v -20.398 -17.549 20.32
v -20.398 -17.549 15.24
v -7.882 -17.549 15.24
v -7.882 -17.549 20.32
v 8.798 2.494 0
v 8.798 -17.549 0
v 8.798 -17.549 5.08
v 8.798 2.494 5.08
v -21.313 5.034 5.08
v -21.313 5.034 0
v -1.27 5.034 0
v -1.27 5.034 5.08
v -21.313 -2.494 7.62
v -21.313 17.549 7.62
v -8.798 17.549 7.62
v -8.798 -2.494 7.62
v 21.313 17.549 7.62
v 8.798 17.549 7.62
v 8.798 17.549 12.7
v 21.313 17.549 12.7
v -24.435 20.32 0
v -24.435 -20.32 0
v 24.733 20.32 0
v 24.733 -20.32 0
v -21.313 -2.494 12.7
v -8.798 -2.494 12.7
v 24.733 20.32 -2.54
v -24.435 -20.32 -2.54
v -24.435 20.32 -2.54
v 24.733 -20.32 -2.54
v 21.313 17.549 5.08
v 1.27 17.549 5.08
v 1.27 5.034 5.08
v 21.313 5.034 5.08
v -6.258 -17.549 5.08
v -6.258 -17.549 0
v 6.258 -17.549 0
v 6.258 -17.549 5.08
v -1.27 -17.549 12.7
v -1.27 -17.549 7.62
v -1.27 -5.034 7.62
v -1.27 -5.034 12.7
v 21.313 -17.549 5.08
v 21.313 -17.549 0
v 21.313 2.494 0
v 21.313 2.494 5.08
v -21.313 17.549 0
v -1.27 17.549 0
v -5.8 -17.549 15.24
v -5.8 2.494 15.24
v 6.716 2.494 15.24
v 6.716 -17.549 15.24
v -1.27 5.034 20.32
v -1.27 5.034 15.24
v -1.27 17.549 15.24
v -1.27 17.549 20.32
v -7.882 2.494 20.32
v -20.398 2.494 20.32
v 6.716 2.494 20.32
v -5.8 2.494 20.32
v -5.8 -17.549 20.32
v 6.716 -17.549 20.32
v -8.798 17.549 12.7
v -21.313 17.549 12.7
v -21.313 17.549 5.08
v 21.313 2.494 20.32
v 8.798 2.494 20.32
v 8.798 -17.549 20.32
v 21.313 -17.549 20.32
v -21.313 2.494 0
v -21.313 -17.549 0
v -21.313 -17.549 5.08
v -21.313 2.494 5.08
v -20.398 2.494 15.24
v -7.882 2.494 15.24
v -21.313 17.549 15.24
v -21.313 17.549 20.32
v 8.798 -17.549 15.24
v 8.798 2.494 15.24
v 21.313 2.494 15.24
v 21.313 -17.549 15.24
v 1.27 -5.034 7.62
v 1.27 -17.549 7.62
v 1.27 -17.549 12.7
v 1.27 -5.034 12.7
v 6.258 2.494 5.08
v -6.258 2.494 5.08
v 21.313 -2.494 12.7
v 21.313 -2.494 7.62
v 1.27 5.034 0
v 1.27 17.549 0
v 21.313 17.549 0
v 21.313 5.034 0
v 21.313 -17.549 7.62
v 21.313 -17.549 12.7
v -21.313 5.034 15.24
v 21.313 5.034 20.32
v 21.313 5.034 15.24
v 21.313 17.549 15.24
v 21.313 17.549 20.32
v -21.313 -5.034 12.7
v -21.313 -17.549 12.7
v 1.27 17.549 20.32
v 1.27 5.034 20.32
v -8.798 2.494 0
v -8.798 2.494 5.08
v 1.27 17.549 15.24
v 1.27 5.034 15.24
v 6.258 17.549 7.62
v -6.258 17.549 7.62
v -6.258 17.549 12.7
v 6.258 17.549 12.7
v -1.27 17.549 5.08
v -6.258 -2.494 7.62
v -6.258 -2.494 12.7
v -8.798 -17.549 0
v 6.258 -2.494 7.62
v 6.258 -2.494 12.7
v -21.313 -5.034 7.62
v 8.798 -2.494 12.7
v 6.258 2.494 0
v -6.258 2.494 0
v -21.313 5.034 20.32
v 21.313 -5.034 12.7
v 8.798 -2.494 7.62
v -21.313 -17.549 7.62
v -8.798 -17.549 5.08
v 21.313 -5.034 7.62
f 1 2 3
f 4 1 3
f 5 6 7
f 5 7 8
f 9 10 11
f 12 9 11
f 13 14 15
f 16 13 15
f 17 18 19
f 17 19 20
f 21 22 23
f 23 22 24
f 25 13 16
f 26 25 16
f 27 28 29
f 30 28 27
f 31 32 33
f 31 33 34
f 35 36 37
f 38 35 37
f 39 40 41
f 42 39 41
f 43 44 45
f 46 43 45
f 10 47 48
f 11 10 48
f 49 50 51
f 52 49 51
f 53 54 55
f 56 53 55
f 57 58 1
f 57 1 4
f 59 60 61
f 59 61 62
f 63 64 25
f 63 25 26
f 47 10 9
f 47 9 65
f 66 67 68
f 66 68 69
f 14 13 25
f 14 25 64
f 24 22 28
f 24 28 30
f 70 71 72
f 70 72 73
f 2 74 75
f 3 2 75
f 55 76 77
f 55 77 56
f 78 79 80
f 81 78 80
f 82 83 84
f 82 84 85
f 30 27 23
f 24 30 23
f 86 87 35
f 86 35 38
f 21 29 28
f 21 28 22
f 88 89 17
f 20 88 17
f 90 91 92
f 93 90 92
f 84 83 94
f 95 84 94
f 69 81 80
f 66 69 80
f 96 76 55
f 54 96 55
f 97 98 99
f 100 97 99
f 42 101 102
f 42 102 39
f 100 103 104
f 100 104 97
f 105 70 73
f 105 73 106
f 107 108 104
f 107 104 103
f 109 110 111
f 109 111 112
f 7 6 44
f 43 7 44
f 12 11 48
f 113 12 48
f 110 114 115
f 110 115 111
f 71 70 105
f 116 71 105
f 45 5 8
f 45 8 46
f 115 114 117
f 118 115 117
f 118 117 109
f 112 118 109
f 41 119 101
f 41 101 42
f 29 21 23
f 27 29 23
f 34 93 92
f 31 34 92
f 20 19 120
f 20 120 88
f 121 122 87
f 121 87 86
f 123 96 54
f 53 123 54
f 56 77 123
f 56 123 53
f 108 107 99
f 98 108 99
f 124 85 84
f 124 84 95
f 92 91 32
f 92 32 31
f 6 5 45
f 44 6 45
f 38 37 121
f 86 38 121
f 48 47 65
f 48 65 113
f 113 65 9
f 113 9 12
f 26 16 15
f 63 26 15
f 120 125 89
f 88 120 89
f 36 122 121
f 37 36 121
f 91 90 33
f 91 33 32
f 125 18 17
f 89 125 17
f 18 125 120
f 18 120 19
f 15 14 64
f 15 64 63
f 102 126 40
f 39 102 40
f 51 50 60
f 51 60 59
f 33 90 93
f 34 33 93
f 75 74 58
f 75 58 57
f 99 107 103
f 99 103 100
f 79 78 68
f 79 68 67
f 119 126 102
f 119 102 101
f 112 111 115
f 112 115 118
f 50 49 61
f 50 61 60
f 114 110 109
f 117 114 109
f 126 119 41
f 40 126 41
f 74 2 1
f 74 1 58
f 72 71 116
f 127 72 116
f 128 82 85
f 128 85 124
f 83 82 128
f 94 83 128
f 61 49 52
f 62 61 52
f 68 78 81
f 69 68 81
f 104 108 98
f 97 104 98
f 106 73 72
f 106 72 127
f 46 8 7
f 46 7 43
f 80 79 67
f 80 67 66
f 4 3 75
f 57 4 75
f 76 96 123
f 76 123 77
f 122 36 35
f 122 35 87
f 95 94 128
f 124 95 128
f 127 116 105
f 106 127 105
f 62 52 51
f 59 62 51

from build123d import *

# Parameters (mm, degrees)
F0_W     = 20.0432797
F0_H     = 12.5155309215
F1_DEPTH = 5.08
F0_W_2   = 12.5155309215
F0_H_2   = 20.0432797
F2_W     = 49.1681545973
F2_H     = 2.54
F3_DEPTH = 20.32
F5_W     = 12.5155309215
F5_H     = 20.0432797
F6_DEPTH = 5.08
F5_W_2   = 20.0432797
F5_H_2   = 12.5155309215
F8_W     = 20.0432797
F8_H     = 12.5155309215
F9_DEPTH = 5.08
F8_W_2   = 12.5155309215
F8_H_2   = 20.0432797


with BuildPart() as f1:
    # F0 (on Top) → F1 (new body)
    with BuildSketch(Plane.XY):
        with Locations((11.29163985, 11.2916406392)):
            Rectangle(F0_W, F0_H)
    extrude(amount=F1_DEPTH)


with BuildPart() as f1b:
    # F0 (on Top) → F1, piece 2 (new body)
    with BuildSketch(Plane.XY):
        with Locations((15.0555253608, -7.5277646715)):
            Rectangle(F0_W_2, F0_H_2)
    extrude(amount=F1_DEPTH)


with BuildPart() as f1c:
    # F0 (on Top) → F1, piece 3 (new body)
    with BuildSketch(Plane.XY):
        with Locations((-5.5608e-06, -7.5277646715)):
            Rectangle(F0_W_2, F0_H_2)
    extrude(amount=F1_DEPTH)


with BuildPart() as f1d:
    # F0 (on Top) → F1, piece 4 (new body)
    with BuildSketch(Plane.XY):
        with Locations((-15.0555364823, -7.5277646715)):
            Rectangle(F0_W_2, F0_H_2)
    extrude(amount=F1_DEPTH)


with BuildPart() as f1e:
    # F0 (on Top) → F1, piece 5 (new body)
    with BuildSketch(Plane.XY):
        with Locations((-11.29163985, 11.2916406392)):
            Rectangle(F0_W, F0_H)
    extrude(amount=F1_DEPTH)


with BuildPart() as f3:
    # F2 (on Front) → F3 (new body, symmetric)
    with BuildSketch(Plane.XZ):
        with Locations((0.1489929855, -1.27)):
            Rectangle(F2_W, F2_H)
    extrude(amount=F3_DEPTH, both=True)


with BuildPart() as f6:
    # F5 (on offset) → F6 (new body)
    with BuildSketch(Plane.XY.offset(7.62)):
        with Locations((5.5608e-06, 7.52776625)):
            Rectangle(F5_W, F5_H)
    extrude(amount=F6_DEPTH)


with BuildPart() as f6b:
    # F5 (on offset) → F6, piece 2 (new body)
    with BuildSketch(Plane.XY.offset(7.62)):
        with Locations((15.0555253608, 7.52776625)):
            Rectangle(F5_W, F5_H)
    extrude(amount=F6_DEPTH)


with BuildPart() as f6c:
    # F5 (on offset) → F6, piece 3 (new body)
    with BuildSketch(Plane.XY.offset(7.62)):
        with Locations((11.2916509715, -11.2916390608)):
            Rectangle(F5_W_2, F5_H_2)
    extrude(amount=F6_DEPTH)


with BuildPart() as f6d:
    # F5 (on offset) → F6, piece 4 (new body)
    with BuildSketch(Plane.XY.offset(7.62)):
        with Locations((-11.2916287285, -11.2916390608)):
            Rectangle(F5_W_2, F5_H_2)
    extrude(amount=F6_DEPTH)


with BuildPart() as f6e:
    # F5 (on offset) → F6, piece 5 (new body)
    with BuildSketch(Plane.XY.offset(7.62)):
        with Locations((-15.0555142392, 7.52776625)):
            Rectangle(F5_W, F5_H)
    extrude(amount=F6_DEPTH)


with BuildPart() as f9:
    # F8 (on offset) → F9 (new body)
    with BuildSketch(Plane.XY.offset(15.24)):
        with Locations((-11.29163985, 11.2916406392)):
            Rectangle(F8_W, F8_H)
    extrude(amount=F9_DEPTH)


with BuildPart() as f9b:
    # F8 (on offset) → F9, piece 2 (new body)
    with BuildSketch(Plane.XY.offset(15.24)):
        with Locations((11.2916509715, 11.2916406392)):
            Rectangle(F8_W, F8_H)
    extrude(amount=F9_DEPTH)


with BuildPart() as f9c:
    # F8 (on offset) → F9, piece 3 (new body)
    with BuildSketch(Plane.XY.offset(15.24)):
        with Locations((15.0555253608, -7.5277646715)):
            Rectangle(F8_W_2, F8_H_2)
    extrude(amount=F9_DEPTH)


with BuildPart() as f9d:
    # F8 (on offset) → F9, piece 4 (new body)
    with BuildSketch(Plane.XY.offset(15.24)):
        with Locations((0.4578256088, -7.5277646715)):
            Rectangle(F8_W_2, F8_H_2)
    extrude(amount=F9_DEPTH)


with BuildPart() as f9e:
    # F8 (on offset) → F9, piece 5 (new body)
    with BuildSketch(Plane.XY.offset(15.24)):
        with Locations((-14.1398741431, -7.5277646715)):
            Rectangle(F8_W_2, F8_H_2)
    extrude(amount=F9_DEPTH)


solid = Compound([f1.part, f1b.part, f1c.part, f1d.part, f1e.part, f3.part, f6.part, f6b.part, f6c.part, f6d.part, f6e.part, f9.part, f9b.part, f9c.part, f9d.part, f9e.part])
